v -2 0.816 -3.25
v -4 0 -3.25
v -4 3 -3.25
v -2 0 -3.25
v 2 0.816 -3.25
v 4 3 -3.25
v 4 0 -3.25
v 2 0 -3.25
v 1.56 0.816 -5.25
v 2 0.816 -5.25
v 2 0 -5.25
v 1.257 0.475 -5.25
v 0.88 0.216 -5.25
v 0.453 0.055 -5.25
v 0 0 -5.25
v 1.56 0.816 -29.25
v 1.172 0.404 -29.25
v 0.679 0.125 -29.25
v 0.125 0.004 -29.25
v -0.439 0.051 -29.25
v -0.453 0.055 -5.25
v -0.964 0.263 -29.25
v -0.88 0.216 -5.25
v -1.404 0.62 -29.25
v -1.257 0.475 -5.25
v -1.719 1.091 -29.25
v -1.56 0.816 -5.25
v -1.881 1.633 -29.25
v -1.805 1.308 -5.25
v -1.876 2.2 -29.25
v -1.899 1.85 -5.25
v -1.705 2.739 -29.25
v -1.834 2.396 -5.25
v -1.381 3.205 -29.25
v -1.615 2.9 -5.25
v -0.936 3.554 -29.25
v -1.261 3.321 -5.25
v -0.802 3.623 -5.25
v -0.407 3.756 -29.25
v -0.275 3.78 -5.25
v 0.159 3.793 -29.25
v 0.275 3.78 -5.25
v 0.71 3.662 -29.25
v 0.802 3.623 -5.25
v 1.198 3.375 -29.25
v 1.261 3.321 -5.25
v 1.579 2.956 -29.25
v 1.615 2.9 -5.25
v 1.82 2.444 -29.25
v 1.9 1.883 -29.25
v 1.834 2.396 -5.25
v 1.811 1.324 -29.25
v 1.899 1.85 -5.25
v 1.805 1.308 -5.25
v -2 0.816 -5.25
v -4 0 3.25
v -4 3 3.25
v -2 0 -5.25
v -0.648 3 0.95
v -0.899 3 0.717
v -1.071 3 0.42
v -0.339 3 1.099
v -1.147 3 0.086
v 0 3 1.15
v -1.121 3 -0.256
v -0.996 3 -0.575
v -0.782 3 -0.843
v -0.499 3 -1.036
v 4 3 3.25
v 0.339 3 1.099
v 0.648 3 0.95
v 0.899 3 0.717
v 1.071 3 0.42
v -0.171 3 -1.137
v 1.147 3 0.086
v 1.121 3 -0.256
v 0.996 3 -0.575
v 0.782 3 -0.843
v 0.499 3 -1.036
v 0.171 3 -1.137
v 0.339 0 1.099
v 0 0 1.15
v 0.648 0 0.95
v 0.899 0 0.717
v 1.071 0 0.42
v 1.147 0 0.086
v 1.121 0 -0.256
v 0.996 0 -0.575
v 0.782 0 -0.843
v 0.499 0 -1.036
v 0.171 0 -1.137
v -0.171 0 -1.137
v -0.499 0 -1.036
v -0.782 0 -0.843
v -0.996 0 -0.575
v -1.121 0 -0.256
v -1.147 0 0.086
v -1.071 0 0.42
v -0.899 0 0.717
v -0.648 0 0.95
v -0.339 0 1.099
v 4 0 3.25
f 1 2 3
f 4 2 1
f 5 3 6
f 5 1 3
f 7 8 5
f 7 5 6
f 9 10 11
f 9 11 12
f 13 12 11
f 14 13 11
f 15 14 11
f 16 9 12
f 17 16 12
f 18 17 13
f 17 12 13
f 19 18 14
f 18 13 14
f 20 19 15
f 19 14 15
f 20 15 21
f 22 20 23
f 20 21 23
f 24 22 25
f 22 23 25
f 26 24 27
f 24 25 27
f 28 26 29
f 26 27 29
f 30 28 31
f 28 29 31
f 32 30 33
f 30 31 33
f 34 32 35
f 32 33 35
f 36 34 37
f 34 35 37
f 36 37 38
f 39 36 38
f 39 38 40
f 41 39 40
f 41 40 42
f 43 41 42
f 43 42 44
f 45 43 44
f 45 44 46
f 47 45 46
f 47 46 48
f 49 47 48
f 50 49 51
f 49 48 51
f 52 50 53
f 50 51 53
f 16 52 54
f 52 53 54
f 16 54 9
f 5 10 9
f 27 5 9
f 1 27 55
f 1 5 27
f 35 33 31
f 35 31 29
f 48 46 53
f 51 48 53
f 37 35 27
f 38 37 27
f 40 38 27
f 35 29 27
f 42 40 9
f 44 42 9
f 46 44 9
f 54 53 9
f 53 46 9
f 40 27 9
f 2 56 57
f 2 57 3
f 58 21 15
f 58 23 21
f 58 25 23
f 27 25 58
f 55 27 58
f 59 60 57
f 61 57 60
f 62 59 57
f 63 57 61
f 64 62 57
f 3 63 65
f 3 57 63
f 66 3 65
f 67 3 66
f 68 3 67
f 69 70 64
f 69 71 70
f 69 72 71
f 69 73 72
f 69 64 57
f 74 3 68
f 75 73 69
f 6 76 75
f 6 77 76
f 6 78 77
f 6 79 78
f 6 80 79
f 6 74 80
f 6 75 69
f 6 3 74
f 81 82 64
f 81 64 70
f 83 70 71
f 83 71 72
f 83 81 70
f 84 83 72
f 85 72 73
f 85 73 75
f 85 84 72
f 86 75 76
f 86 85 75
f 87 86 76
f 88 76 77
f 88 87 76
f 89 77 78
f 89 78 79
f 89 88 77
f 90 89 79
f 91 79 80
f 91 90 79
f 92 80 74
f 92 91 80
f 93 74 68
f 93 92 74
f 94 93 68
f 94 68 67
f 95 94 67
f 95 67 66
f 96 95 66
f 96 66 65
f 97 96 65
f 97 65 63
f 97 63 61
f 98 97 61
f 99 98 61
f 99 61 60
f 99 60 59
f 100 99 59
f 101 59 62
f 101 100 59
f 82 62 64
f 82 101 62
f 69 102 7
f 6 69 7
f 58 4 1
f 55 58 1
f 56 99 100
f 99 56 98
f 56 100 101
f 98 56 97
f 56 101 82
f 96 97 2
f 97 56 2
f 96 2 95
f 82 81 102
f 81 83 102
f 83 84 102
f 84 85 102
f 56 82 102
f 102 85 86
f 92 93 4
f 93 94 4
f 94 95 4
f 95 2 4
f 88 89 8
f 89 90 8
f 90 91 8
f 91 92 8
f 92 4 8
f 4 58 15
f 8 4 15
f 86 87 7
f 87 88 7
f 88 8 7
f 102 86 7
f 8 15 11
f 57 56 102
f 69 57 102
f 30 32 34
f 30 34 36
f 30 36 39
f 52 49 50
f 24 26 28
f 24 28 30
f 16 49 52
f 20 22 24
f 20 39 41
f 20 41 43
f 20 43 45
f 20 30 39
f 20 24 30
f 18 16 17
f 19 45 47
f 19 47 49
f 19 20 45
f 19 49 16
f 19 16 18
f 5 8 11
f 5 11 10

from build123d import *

# Parameters (mm, degrees)
ESBO_O1_W                = 8
ESBO_O1_H                = 6.5
ESBO_O1_R                = 1.15
RESSALTO_EXTRUS_O1_DEPTH = 3
ESBO_O2_W                = 4
ESBO_O2_H                = 0.815950815
RESSALTO_EXTRUS_O2_DEPTH = 2
ESBO_O3_R                = 1.9
RESSALTO_EXTRUS_O3_DEPTH = 24


with BuildPart() as part:
    # Esboço1 → Ressalto-extrusão1 (new body)
    with BuildSketch(Plane(origin=(0, 0, 0), x_dir=(1, 0, 0), z_dir=(0, 1, 0))):
        Rectangle(ESBO_O1_W, ESBO_O1_H)
        with Locations(Location((0, 0, 0), (0, 0, 270))):
            Circle(ESBO_O1_R, mode=Mode.SUBTRACT)
    extrude(amount=RESSALTO_EXTRUS_O1_DEPTH)

    # Esboço2 → Ressalto-extrusão2 (add)
    with BuildSketch(Plane(origin=(0, 0, -3.25), x_dir=(-1, 0, 0), z_dir=(0, 0, -1))):
        with Locations((0, 0.407975407)):
            Rectangle(ESBO_O2_W, ESBO_O2_H)
    extrude(amount=RESSALTO_EXTRUS_O2_DEPTH)

    # Esboço3 → Ressalto-extrusão3 (add)
    with BuildSketch(Plane(origin=(0, 0, -5.25), x_dir=(-1, 0, 0), z_dir=(0, 0, -1))):
        with Locations(Location((0, 1.9, 0), (0, 0, 214.788741518))):
            Circle(ESBO_O3_R)
    extrude(amount=RESSALTO_EXTRUS_O3_DEPTH)


solid = part.part
